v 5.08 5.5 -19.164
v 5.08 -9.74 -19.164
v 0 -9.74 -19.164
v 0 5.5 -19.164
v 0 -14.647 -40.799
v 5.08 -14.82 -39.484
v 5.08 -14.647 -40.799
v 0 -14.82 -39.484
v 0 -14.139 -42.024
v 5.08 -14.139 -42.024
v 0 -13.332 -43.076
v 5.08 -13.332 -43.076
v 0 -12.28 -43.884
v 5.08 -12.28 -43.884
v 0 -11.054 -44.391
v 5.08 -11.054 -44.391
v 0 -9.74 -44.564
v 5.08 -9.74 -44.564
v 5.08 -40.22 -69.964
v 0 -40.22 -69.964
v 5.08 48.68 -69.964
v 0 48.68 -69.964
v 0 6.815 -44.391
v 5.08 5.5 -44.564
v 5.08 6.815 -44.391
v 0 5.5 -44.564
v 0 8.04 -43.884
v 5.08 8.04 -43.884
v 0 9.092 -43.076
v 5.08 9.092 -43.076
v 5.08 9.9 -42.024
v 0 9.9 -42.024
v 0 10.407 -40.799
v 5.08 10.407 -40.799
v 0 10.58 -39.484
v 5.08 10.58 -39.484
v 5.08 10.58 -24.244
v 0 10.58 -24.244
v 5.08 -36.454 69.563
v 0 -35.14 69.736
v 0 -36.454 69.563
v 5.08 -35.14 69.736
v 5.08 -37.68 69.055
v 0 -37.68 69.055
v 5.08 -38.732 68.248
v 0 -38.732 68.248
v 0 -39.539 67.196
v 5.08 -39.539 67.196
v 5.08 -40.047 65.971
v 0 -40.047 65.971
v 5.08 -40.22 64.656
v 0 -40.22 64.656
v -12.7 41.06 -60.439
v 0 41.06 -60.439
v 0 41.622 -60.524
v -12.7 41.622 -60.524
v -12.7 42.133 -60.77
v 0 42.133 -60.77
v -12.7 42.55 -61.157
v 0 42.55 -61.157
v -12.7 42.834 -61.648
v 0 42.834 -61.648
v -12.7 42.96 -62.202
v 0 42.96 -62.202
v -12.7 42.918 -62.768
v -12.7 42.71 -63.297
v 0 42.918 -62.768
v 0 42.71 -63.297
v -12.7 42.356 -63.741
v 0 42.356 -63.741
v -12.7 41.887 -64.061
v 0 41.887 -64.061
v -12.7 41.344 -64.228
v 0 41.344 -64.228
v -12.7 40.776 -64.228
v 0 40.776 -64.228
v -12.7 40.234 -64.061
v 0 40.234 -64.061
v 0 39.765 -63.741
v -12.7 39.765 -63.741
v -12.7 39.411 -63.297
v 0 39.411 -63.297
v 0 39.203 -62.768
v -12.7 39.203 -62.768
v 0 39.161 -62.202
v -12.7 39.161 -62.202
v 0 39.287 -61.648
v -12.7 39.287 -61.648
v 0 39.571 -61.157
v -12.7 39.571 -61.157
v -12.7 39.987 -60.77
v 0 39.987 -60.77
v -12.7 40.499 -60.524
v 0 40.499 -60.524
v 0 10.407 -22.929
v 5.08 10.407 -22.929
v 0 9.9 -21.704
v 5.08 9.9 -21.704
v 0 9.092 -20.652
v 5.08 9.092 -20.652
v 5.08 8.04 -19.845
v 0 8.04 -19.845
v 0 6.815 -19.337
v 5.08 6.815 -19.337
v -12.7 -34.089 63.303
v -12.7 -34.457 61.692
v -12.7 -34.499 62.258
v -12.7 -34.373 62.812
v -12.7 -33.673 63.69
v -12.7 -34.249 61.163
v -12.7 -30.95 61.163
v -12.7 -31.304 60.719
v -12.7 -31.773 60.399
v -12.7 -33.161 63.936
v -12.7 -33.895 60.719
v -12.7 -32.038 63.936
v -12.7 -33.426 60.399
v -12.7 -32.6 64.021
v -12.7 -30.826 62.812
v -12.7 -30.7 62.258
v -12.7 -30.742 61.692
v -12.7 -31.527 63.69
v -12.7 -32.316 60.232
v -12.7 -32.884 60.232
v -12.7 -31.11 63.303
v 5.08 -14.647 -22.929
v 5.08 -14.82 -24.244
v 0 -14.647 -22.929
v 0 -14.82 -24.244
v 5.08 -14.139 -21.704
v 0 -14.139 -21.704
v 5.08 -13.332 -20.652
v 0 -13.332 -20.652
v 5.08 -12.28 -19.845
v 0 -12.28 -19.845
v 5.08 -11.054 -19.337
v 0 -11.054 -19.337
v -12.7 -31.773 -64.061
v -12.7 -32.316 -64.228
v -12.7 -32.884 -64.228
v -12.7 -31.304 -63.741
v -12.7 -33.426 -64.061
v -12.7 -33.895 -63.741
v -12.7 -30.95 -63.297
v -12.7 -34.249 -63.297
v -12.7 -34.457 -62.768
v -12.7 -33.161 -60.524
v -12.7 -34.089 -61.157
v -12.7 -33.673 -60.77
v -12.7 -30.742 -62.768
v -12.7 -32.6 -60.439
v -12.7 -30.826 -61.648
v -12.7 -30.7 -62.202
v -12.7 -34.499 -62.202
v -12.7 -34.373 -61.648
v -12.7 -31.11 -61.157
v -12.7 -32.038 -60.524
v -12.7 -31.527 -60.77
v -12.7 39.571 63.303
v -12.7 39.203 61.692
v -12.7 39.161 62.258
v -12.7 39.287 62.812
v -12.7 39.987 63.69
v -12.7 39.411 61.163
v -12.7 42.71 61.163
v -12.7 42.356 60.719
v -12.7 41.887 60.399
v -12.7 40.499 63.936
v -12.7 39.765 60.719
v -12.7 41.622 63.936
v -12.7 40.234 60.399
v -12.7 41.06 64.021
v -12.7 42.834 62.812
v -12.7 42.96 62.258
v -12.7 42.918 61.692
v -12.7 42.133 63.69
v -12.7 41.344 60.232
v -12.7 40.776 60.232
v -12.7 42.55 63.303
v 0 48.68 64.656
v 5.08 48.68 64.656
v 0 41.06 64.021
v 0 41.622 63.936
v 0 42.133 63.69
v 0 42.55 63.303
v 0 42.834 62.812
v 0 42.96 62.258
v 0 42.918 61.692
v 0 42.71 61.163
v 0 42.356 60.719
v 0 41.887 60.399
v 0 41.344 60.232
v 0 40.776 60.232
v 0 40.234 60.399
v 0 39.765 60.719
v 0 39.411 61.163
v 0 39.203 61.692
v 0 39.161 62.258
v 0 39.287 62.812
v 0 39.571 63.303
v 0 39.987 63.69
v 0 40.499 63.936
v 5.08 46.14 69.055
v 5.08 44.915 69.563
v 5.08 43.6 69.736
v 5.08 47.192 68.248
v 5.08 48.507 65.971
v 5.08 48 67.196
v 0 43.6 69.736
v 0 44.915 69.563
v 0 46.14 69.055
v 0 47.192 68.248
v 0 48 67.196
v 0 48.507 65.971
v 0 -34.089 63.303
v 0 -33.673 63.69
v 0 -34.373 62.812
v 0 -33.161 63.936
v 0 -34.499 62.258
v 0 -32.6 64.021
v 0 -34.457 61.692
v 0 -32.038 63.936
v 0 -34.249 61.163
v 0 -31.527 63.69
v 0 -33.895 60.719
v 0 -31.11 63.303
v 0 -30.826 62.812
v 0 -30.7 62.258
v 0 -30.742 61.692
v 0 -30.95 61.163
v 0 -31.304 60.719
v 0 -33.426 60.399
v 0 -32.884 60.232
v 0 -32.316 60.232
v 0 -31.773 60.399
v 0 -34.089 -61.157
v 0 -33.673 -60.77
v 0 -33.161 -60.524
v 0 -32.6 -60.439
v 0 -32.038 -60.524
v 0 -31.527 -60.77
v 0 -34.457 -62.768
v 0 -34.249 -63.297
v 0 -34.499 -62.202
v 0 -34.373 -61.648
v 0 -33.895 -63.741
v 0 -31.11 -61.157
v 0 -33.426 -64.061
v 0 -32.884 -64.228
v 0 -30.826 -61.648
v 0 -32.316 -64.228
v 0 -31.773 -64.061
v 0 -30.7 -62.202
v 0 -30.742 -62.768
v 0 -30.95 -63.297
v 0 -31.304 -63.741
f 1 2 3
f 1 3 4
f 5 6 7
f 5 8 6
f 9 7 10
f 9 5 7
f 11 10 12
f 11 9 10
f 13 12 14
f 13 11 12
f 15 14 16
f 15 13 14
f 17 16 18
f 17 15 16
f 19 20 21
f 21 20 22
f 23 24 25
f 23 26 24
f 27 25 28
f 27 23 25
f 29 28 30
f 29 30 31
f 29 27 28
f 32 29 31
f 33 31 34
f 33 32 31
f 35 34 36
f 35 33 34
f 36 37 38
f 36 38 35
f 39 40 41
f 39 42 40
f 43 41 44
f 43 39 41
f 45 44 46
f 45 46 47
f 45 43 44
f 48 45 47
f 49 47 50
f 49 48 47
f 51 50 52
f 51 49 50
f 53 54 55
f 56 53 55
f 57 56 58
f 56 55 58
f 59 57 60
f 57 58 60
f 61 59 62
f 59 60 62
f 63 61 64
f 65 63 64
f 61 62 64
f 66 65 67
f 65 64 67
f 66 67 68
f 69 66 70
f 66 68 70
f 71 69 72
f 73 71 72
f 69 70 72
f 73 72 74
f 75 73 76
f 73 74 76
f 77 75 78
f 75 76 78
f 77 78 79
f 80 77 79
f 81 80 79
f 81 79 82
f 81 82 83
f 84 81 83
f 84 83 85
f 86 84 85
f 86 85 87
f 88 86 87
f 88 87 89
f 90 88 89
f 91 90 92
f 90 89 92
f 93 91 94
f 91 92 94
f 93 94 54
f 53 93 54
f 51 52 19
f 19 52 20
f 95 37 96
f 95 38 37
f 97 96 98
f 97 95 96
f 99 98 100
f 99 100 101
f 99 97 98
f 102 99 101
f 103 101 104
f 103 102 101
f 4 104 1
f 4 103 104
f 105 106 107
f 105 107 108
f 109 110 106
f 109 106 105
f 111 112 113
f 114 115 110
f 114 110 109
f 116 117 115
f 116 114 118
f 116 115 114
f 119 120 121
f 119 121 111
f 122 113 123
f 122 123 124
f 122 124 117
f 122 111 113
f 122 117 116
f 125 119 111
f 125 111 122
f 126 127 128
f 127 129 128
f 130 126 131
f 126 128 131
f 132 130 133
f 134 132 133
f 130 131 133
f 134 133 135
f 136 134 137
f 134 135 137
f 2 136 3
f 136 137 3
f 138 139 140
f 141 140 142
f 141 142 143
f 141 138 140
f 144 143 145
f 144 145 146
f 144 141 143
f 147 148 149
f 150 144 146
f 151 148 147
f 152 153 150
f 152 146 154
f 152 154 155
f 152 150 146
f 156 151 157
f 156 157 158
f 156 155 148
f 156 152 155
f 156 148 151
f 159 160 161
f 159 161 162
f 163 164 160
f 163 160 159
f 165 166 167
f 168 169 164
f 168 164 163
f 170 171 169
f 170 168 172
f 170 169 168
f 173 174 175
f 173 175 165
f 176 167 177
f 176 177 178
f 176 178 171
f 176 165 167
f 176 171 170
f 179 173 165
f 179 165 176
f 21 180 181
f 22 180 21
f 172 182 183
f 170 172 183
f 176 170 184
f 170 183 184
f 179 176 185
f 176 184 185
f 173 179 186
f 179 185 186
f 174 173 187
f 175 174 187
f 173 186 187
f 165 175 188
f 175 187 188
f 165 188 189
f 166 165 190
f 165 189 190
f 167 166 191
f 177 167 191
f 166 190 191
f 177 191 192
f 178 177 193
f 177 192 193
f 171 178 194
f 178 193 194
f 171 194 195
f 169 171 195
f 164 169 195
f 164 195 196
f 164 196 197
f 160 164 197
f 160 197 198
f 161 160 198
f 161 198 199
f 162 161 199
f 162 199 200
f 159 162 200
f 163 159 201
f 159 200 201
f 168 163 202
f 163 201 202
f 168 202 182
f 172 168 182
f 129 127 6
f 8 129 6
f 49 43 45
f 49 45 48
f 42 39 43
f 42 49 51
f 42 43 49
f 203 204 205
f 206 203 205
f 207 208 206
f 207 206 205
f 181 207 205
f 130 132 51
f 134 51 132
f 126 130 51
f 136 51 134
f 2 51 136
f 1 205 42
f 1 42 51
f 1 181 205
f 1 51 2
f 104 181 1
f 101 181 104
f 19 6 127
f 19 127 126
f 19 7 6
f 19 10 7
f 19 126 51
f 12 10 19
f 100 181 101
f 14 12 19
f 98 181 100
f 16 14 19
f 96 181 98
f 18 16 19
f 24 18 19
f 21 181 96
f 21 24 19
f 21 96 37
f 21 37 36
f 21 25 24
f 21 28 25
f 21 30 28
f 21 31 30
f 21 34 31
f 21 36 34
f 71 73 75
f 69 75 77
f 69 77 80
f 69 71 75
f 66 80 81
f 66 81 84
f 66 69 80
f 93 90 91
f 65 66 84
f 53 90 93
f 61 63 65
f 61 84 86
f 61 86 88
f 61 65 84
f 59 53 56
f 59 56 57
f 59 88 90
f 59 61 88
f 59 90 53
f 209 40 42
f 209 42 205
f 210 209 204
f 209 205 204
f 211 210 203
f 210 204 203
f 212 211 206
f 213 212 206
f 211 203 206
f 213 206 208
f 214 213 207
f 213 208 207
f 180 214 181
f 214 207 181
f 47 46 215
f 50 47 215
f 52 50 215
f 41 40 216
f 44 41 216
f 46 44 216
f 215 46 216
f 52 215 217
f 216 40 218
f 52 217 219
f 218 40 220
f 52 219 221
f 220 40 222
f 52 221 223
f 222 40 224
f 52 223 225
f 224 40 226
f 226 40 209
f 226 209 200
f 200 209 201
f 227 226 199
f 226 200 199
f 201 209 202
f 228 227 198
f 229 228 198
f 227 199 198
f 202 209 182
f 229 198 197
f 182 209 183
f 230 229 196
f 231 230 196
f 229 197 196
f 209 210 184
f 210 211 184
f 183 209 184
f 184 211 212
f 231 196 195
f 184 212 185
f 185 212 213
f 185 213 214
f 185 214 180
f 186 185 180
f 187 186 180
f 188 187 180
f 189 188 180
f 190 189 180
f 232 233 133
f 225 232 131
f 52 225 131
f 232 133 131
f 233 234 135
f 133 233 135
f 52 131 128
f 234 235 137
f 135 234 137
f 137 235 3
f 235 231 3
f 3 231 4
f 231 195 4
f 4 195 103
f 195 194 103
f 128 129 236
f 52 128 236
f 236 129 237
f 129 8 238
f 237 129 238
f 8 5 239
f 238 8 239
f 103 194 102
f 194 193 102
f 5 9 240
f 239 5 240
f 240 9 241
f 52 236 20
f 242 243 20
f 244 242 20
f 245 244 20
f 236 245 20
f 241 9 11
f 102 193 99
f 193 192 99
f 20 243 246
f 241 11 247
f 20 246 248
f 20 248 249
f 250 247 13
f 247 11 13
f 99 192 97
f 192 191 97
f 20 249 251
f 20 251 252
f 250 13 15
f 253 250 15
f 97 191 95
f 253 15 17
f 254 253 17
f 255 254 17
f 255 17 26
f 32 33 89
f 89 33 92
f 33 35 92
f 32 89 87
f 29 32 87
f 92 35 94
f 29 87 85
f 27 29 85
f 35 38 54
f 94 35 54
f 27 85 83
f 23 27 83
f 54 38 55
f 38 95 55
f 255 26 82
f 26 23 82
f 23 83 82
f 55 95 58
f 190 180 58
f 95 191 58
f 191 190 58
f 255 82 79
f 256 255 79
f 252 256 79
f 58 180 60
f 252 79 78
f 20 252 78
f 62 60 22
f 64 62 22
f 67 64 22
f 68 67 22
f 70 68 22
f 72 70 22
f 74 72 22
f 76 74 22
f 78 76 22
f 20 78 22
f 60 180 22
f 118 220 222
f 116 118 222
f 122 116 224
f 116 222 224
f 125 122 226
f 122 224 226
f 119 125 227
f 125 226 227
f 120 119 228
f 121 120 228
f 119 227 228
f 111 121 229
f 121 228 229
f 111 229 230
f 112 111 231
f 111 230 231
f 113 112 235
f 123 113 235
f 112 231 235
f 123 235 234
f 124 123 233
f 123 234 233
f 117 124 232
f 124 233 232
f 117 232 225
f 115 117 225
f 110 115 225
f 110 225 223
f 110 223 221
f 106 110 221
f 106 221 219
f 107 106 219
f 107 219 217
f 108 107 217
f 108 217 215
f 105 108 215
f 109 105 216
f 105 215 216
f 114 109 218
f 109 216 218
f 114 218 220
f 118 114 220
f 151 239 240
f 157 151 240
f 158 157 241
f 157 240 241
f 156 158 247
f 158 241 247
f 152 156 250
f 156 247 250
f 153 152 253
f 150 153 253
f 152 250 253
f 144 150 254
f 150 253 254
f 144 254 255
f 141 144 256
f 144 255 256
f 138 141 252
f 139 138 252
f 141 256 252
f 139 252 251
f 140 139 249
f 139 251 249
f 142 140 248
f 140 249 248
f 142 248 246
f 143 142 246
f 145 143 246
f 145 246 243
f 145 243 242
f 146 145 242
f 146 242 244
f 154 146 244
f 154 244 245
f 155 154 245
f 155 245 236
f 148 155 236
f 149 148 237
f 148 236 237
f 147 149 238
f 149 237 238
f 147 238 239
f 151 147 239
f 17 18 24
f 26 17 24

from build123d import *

# Parameters (mm, degrees)
SKETCH2_W           = 139.7
SKETCH2_H           = 88.9
BOSS_EXTRUDE1_DEPTH = 5.08
SKETCH3_R           = 1.905
BOSS_EXTRUDE2_DEPTH = 12.7
FILLET1_R           = 5.08
SKETCH4_W           = 25.4
SKETCH4_H           = 25.4
CUT_EXTRUDE1_DEPTH  = 5.08
FILLET2_R           = 5.08


with BuildPart() as part:
    # Sketch2 → Boss-Extrude1 (new body)
    with BuildSketch(Plane(origin=(0, 0, 0), x_dir=(0, 0, -1), z_dir=(1, 0, 0))):
        with Locations((0.114290462, 4.230322371)):
            Rectangle(SKETCH2_W, SKETCH2_H)
    extrude(amount=BOSS_EXTRUDE1_DEPTH)

    # Sketch3 → Boss-Extrude2 (add)
    with BuildSketch(Plane.ZY):
        with Locations((-62.344290462, 41.060322371)):
            Circle(SKETCH3_R)
        with Locations((-62.344290462, -32.599677629)):
            Circle(SKETCH3_R)
        with Locations((62.115709538, 41.060322371)):
            Circle(SKETCH3_R)
        with Locations((62.115709538, -32.599677629)):
            Circle(SKETCH3_R)
    extrude(amount=BOSS_EXTRUDE2_DEPTH)

    # Fillet1
    fillet1_edges = [part.edges().sort_by_distance(p)[0] for p in [
        (2.54, -40.219677629, 69.735709538),
        (2.54, 48.680322371, 69.735709538),
    ]]
    fillet(fillet1_edges, radius=FILLET1_R)

    # Sketch4 → Cut-Extrude1 (cut)
    with BuildSketch(Plane(origin=(5.08, 0, 0), x_dir=(0, 0, -1), z_dir=(1, 0, 0))):
        with Locations((31.864290462, -2.119677629)):
            Rectangle(SKETCH4_W, SKETCH4_H)
    extrude(amount=-CUT_EXTRUDE1_DEPTH, mode=Mode.SUBTRACT)

    # Fillet2
    fillet2_edges = [part.edges().sort_by_distance(p)[0] for p in [
        (2.54, 10.580322371, -44.564290462),
        (2.54, -14.819677629, -44.564290462),
        (2.54, -14.819677629, -19.164290462),
        (2.54, 10.580322371, -19.164290462),
    ]]
    fillet(fillet2_edges, radius=FILLET2_R)


solid = part.part
